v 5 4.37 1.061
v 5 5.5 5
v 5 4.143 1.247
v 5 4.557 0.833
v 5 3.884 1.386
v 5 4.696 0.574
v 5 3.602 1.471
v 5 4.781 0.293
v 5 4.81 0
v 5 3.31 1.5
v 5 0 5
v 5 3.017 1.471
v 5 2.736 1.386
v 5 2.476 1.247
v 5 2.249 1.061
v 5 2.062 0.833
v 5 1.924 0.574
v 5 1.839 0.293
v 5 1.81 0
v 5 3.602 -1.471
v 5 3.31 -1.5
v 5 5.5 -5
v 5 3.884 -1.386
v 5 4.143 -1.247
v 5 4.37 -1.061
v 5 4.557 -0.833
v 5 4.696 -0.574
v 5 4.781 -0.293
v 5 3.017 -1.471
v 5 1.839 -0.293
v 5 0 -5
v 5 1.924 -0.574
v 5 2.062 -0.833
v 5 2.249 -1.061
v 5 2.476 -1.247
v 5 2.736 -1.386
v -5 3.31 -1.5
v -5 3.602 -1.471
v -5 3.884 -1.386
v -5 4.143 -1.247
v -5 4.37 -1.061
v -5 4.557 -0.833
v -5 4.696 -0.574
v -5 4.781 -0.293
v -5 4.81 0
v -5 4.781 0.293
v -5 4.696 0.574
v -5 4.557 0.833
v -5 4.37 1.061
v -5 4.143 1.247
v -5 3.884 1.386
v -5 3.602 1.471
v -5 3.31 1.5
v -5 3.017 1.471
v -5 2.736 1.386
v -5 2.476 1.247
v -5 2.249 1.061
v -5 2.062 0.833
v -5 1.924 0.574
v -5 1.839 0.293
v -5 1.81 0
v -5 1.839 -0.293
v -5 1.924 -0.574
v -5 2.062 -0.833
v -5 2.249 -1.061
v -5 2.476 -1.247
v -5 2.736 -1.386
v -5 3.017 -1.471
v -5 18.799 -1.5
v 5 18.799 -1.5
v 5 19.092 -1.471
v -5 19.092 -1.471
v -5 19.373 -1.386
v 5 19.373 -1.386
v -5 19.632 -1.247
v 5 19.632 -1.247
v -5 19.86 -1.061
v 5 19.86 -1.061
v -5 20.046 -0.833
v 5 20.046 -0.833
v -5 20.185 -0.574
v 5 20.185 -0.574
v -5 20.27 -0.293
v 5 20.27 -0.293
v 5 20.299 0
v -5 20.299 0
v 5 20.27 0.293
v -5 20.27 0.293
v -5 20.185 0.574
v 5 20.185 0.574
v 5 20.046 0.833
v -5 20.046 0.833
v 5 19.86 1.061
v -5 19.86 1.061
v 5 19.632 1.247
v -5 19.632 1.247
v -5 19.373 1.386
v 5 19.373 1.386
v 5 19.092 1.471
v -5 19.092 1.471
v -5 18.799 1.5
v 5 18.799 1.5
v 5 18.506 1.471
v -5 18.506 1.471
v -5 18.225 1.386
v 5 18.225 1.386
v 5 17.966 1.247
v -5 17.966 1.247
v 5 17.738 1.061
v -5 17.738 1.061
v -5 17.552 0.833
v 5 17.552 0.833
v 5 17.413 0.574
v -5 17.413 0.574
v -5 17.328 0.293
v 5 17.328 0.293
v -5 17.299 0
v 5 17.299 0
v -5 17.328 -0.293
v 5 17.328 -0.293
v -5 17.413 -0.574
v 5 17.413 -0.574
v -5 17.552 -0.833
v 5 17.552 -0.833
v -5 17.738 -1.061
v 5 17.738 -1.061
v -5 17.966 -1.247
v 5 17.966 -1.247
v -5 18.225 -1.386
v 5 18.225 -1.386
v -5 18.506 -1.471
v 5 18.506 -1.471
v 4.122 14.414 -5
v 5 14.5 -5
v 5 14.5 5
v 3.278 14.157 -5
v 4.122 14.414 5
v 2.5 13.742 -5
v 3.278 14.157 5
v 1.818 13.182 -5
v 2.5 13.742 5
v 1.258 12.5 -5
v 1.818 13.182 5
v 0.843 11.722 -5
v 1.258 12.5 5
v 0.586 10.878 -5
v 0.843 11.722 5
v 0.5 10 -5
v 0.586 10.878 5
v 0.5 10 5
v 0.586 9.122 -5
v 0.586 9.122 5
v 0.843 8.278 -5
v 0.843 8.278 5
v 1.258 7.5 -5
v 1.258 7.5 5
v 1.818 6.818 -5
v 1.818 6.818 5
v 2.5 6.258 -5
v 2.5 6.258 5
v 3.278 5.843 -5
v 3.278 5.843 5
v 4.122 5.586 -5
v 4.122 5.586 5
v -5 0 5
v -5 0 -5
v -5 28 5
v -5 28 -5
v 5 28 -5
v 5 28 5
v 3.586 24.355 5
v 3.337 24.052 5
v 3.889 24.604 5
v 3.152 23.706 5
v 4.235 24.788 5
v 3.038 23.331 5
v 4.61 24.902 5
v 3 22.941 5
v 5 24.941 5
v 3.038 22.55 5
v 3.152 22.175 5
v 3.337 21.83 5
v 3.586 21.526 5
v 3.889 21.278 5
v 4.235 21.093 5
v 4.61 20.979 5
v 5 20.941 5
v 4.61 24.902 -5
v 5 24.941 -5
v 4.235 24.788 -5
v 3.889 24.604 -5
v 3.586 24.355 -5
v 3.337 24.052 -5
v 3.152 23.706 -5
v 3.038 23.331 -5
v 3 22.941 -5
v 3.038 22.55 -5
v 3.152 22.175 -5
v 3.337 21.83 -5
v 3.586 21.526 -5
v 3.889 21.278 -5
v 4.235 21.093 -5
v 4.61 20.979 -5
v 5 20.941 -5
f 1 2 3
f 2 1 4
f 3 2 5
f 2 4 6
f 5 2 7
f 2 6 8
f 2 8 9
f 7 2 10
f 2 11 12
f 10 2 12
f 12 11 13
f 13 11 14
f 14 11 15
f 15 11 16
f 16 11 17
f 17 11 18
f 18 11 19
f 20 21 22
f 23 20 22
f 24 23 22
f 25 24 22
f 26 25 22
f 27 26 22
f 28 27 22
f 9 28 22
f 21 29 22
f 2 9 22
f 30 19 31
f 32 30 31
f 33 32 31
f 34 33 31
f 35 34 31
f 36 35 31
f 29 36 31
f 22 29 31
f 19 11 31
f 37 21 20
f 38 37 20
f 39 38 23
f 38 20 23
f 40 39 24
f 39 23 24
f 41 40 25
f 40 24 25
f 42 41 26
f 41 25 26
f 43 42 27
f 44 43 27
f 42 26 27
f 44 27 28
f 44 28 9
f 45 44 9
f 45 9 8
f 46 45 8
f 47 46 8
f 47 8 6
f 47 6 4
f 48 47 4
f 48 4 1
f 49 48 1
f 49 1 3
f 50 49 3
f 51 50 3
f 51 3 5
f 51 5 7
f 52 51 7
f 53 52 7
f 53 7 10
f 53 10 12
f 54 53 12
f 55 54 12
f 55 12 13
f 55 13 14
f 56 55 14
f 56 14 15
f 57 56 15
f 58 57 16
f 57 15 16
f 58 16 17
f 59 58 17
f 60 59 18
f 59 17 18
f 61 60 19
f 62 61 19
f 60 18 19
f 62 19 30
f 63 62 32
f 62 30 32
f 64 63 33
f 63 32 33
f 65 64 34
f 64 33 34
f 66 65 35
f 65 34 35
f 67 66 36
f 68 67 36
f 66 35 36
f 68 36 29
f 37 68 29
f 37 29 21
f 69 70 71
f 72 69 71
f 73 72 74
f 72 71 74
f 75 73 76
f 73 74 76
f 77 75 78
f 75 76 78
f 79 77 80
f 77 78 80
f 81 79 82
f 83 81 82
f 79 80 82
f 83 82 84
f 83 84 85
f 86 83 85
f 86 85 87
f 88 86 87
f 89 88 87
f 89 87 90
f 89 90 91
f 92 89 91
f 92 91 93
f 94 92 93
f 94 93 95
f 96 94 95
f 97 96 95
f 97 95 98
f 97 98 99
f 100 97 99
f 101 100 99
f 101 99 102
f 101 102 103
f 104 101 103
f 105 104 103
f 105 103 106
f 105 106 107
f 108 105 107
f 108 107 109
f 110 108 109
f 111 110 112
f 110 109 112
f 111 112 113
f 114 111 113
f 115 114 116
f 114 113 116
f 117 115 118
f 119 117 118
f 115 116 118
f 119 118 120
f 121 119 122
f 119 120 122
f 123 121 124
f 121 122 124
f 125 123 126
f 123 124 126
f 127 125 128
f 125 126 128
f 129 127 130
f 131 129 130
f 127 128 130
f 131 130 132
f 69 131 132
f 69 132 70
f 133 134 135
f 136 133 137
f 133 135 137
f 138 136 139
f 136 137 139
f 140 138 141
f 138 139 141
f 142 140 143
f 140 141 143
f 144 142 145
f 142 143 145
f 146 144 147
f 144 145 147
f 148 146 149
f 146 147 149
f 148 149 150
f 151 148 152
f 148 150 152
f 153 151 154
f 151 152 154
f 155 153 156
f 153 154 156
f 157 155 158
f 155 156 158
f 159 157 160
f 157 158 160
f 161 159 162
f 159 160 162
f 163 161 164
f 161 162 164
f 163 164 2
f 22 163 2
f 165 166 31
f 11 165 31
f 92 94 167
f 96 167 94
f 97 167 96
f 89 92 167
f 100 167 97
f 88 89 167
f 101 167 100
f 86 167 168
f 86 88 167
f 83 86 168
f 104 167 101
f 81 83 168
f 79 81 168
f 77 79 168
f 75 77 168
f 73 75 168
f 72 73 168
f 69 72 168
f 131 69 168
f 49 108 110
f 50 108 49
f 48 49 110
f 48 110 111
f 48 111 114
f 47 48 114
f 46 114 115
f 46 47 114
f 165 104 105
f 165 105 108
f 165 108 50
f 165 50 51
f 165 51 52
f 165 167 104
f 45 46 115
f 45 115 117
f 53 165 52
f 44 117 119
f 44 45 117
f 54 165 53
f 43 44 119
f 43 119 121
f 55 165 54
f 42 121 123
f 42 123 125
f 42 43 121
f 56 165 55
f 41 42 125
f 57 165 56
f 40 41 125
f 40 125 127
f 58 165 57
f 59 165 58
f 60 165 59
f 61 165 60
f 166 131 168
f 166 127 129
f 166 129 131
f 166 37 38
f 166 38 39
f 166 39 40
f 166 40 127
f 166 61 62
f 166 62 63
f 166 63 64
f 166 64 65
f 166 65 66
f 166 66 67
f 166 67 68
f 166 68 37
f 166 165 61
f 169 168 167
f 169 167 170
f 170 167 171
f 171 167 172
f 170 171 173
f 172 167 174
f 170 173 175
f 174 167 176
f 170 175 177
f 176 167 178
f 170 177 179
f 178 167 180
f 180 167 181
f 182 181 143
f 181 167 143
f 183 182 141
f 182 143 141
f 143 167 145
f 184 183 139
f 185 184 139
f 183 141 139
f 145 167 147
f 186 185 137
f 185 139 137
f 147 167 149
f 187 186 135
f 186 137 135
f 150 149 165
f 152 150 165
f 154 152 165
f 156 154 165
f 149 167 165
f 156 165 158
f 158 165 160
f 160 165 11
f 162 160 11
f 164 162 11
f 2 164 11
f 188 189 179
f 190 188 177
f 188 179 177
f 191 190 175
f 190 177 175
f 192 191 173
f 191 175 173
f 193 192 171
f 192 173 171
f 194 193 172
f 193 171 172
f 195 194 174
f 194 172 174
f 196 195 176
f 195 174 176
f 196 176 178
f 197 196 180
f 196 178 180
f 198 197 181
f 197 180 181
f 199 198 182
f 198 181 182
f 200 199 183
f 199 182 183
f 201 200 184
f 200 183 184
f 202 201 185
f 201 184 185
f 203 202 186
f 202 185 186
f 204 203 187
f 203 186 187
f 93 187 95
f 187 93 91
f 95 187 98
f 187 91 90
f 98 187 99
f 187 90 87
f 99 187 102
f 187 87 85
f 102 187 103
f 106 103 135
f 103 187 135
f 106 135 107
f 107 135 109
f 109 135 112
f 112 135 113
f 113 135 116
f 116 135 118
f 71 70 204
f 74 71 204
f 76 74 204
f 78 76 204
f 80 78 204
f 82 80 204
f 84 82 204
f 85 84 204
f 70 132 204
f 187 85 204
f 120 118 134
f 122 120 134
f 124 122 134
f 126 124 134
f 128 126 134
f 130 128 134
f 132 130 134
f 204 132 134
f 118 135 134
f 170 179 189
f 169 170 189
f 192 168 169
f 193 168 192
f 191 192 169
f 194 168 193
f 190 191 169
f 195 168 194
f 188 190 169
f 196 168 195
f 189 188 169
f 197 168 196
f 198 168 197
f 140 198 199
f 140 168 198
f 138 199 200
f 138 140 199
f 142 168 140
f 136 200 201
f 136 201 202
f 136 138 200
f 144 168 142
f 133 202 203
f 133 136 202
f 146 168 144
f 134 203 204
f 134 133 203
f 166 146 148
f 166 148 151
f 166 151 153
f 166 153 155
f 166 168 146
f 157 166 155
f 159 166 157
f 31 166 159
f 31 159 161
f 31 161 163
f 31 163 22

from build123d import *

# Parameters (mm, degrees)
SKETCH_1_W            = 10
SKETCH_1_H            = 10
EXTRUDE_1_DEPTH       = 28
SKETCH_2_R            = 4.499999995
CUT_EXTRUDE_2_DEPTH   = 31.149626863
SKETCH_3_R            = 1.5
CUT_EXTRUDE_1_DEPTH   = 31.149626863
SKETCH_4_R            = 1.999999994
CUT_EXTRUDE_2_2_DEPTH = 31.149626863


with BuildPart() as part:
    # Эскиз1 → Вытянуть1 (new body)
    with BuildSketch(Plane(origin=(0, 0, 0), x_dir=(1, 0, 0), z_dir=(0, 1, 0))):
        Rectangle(SKETCH_1_W, SKETCH_1_H)
    extrude(amount=EXTRUDE_1_DEPTH)

    # Эскиз2 → Cut-Extrude 2 (cut, through all)
    with BuildSketch(Plane.XY.offset(5)):
        with Locations((5.000000005, 10.000000001)):
            Circle(SKETCH_2_R)
    extrude(amount=-CUT_EXTRUDE_2_DEPTH, mode=Mode.SUBTRACT)

    # Эскиз3 → Вырез-Вытянуть1 (cut, through all)
    with BuildSketch(Plane(origin=(5, 0, 0), x_dir=(0, 0, -1), z_dir=(1, 0, 0))):
        with Locations((0, 3.309697202)):
            Circle(SKETCH_3_R)
        with Locations((0, 18.798896008)):
            Circle(SKETCH_3_R)
    extrude(amount=-CUT_EXTRUDE_1_DEPTH, mode=Mode.SUBTRACT)

    # Эскиз4 → Cut-Extrude 2 2 (cut, through all)
    with BuildSketch(Plane.XY.offset(5)):
        with Locations((4.999999971, 22.940656165)):
            Circle(SKETCH_4_R)
    extrude(amount=-CUT_EXTRUDE_2_2_DEPTH, mode=Mode.SUBTRACT)


solid = part.part
